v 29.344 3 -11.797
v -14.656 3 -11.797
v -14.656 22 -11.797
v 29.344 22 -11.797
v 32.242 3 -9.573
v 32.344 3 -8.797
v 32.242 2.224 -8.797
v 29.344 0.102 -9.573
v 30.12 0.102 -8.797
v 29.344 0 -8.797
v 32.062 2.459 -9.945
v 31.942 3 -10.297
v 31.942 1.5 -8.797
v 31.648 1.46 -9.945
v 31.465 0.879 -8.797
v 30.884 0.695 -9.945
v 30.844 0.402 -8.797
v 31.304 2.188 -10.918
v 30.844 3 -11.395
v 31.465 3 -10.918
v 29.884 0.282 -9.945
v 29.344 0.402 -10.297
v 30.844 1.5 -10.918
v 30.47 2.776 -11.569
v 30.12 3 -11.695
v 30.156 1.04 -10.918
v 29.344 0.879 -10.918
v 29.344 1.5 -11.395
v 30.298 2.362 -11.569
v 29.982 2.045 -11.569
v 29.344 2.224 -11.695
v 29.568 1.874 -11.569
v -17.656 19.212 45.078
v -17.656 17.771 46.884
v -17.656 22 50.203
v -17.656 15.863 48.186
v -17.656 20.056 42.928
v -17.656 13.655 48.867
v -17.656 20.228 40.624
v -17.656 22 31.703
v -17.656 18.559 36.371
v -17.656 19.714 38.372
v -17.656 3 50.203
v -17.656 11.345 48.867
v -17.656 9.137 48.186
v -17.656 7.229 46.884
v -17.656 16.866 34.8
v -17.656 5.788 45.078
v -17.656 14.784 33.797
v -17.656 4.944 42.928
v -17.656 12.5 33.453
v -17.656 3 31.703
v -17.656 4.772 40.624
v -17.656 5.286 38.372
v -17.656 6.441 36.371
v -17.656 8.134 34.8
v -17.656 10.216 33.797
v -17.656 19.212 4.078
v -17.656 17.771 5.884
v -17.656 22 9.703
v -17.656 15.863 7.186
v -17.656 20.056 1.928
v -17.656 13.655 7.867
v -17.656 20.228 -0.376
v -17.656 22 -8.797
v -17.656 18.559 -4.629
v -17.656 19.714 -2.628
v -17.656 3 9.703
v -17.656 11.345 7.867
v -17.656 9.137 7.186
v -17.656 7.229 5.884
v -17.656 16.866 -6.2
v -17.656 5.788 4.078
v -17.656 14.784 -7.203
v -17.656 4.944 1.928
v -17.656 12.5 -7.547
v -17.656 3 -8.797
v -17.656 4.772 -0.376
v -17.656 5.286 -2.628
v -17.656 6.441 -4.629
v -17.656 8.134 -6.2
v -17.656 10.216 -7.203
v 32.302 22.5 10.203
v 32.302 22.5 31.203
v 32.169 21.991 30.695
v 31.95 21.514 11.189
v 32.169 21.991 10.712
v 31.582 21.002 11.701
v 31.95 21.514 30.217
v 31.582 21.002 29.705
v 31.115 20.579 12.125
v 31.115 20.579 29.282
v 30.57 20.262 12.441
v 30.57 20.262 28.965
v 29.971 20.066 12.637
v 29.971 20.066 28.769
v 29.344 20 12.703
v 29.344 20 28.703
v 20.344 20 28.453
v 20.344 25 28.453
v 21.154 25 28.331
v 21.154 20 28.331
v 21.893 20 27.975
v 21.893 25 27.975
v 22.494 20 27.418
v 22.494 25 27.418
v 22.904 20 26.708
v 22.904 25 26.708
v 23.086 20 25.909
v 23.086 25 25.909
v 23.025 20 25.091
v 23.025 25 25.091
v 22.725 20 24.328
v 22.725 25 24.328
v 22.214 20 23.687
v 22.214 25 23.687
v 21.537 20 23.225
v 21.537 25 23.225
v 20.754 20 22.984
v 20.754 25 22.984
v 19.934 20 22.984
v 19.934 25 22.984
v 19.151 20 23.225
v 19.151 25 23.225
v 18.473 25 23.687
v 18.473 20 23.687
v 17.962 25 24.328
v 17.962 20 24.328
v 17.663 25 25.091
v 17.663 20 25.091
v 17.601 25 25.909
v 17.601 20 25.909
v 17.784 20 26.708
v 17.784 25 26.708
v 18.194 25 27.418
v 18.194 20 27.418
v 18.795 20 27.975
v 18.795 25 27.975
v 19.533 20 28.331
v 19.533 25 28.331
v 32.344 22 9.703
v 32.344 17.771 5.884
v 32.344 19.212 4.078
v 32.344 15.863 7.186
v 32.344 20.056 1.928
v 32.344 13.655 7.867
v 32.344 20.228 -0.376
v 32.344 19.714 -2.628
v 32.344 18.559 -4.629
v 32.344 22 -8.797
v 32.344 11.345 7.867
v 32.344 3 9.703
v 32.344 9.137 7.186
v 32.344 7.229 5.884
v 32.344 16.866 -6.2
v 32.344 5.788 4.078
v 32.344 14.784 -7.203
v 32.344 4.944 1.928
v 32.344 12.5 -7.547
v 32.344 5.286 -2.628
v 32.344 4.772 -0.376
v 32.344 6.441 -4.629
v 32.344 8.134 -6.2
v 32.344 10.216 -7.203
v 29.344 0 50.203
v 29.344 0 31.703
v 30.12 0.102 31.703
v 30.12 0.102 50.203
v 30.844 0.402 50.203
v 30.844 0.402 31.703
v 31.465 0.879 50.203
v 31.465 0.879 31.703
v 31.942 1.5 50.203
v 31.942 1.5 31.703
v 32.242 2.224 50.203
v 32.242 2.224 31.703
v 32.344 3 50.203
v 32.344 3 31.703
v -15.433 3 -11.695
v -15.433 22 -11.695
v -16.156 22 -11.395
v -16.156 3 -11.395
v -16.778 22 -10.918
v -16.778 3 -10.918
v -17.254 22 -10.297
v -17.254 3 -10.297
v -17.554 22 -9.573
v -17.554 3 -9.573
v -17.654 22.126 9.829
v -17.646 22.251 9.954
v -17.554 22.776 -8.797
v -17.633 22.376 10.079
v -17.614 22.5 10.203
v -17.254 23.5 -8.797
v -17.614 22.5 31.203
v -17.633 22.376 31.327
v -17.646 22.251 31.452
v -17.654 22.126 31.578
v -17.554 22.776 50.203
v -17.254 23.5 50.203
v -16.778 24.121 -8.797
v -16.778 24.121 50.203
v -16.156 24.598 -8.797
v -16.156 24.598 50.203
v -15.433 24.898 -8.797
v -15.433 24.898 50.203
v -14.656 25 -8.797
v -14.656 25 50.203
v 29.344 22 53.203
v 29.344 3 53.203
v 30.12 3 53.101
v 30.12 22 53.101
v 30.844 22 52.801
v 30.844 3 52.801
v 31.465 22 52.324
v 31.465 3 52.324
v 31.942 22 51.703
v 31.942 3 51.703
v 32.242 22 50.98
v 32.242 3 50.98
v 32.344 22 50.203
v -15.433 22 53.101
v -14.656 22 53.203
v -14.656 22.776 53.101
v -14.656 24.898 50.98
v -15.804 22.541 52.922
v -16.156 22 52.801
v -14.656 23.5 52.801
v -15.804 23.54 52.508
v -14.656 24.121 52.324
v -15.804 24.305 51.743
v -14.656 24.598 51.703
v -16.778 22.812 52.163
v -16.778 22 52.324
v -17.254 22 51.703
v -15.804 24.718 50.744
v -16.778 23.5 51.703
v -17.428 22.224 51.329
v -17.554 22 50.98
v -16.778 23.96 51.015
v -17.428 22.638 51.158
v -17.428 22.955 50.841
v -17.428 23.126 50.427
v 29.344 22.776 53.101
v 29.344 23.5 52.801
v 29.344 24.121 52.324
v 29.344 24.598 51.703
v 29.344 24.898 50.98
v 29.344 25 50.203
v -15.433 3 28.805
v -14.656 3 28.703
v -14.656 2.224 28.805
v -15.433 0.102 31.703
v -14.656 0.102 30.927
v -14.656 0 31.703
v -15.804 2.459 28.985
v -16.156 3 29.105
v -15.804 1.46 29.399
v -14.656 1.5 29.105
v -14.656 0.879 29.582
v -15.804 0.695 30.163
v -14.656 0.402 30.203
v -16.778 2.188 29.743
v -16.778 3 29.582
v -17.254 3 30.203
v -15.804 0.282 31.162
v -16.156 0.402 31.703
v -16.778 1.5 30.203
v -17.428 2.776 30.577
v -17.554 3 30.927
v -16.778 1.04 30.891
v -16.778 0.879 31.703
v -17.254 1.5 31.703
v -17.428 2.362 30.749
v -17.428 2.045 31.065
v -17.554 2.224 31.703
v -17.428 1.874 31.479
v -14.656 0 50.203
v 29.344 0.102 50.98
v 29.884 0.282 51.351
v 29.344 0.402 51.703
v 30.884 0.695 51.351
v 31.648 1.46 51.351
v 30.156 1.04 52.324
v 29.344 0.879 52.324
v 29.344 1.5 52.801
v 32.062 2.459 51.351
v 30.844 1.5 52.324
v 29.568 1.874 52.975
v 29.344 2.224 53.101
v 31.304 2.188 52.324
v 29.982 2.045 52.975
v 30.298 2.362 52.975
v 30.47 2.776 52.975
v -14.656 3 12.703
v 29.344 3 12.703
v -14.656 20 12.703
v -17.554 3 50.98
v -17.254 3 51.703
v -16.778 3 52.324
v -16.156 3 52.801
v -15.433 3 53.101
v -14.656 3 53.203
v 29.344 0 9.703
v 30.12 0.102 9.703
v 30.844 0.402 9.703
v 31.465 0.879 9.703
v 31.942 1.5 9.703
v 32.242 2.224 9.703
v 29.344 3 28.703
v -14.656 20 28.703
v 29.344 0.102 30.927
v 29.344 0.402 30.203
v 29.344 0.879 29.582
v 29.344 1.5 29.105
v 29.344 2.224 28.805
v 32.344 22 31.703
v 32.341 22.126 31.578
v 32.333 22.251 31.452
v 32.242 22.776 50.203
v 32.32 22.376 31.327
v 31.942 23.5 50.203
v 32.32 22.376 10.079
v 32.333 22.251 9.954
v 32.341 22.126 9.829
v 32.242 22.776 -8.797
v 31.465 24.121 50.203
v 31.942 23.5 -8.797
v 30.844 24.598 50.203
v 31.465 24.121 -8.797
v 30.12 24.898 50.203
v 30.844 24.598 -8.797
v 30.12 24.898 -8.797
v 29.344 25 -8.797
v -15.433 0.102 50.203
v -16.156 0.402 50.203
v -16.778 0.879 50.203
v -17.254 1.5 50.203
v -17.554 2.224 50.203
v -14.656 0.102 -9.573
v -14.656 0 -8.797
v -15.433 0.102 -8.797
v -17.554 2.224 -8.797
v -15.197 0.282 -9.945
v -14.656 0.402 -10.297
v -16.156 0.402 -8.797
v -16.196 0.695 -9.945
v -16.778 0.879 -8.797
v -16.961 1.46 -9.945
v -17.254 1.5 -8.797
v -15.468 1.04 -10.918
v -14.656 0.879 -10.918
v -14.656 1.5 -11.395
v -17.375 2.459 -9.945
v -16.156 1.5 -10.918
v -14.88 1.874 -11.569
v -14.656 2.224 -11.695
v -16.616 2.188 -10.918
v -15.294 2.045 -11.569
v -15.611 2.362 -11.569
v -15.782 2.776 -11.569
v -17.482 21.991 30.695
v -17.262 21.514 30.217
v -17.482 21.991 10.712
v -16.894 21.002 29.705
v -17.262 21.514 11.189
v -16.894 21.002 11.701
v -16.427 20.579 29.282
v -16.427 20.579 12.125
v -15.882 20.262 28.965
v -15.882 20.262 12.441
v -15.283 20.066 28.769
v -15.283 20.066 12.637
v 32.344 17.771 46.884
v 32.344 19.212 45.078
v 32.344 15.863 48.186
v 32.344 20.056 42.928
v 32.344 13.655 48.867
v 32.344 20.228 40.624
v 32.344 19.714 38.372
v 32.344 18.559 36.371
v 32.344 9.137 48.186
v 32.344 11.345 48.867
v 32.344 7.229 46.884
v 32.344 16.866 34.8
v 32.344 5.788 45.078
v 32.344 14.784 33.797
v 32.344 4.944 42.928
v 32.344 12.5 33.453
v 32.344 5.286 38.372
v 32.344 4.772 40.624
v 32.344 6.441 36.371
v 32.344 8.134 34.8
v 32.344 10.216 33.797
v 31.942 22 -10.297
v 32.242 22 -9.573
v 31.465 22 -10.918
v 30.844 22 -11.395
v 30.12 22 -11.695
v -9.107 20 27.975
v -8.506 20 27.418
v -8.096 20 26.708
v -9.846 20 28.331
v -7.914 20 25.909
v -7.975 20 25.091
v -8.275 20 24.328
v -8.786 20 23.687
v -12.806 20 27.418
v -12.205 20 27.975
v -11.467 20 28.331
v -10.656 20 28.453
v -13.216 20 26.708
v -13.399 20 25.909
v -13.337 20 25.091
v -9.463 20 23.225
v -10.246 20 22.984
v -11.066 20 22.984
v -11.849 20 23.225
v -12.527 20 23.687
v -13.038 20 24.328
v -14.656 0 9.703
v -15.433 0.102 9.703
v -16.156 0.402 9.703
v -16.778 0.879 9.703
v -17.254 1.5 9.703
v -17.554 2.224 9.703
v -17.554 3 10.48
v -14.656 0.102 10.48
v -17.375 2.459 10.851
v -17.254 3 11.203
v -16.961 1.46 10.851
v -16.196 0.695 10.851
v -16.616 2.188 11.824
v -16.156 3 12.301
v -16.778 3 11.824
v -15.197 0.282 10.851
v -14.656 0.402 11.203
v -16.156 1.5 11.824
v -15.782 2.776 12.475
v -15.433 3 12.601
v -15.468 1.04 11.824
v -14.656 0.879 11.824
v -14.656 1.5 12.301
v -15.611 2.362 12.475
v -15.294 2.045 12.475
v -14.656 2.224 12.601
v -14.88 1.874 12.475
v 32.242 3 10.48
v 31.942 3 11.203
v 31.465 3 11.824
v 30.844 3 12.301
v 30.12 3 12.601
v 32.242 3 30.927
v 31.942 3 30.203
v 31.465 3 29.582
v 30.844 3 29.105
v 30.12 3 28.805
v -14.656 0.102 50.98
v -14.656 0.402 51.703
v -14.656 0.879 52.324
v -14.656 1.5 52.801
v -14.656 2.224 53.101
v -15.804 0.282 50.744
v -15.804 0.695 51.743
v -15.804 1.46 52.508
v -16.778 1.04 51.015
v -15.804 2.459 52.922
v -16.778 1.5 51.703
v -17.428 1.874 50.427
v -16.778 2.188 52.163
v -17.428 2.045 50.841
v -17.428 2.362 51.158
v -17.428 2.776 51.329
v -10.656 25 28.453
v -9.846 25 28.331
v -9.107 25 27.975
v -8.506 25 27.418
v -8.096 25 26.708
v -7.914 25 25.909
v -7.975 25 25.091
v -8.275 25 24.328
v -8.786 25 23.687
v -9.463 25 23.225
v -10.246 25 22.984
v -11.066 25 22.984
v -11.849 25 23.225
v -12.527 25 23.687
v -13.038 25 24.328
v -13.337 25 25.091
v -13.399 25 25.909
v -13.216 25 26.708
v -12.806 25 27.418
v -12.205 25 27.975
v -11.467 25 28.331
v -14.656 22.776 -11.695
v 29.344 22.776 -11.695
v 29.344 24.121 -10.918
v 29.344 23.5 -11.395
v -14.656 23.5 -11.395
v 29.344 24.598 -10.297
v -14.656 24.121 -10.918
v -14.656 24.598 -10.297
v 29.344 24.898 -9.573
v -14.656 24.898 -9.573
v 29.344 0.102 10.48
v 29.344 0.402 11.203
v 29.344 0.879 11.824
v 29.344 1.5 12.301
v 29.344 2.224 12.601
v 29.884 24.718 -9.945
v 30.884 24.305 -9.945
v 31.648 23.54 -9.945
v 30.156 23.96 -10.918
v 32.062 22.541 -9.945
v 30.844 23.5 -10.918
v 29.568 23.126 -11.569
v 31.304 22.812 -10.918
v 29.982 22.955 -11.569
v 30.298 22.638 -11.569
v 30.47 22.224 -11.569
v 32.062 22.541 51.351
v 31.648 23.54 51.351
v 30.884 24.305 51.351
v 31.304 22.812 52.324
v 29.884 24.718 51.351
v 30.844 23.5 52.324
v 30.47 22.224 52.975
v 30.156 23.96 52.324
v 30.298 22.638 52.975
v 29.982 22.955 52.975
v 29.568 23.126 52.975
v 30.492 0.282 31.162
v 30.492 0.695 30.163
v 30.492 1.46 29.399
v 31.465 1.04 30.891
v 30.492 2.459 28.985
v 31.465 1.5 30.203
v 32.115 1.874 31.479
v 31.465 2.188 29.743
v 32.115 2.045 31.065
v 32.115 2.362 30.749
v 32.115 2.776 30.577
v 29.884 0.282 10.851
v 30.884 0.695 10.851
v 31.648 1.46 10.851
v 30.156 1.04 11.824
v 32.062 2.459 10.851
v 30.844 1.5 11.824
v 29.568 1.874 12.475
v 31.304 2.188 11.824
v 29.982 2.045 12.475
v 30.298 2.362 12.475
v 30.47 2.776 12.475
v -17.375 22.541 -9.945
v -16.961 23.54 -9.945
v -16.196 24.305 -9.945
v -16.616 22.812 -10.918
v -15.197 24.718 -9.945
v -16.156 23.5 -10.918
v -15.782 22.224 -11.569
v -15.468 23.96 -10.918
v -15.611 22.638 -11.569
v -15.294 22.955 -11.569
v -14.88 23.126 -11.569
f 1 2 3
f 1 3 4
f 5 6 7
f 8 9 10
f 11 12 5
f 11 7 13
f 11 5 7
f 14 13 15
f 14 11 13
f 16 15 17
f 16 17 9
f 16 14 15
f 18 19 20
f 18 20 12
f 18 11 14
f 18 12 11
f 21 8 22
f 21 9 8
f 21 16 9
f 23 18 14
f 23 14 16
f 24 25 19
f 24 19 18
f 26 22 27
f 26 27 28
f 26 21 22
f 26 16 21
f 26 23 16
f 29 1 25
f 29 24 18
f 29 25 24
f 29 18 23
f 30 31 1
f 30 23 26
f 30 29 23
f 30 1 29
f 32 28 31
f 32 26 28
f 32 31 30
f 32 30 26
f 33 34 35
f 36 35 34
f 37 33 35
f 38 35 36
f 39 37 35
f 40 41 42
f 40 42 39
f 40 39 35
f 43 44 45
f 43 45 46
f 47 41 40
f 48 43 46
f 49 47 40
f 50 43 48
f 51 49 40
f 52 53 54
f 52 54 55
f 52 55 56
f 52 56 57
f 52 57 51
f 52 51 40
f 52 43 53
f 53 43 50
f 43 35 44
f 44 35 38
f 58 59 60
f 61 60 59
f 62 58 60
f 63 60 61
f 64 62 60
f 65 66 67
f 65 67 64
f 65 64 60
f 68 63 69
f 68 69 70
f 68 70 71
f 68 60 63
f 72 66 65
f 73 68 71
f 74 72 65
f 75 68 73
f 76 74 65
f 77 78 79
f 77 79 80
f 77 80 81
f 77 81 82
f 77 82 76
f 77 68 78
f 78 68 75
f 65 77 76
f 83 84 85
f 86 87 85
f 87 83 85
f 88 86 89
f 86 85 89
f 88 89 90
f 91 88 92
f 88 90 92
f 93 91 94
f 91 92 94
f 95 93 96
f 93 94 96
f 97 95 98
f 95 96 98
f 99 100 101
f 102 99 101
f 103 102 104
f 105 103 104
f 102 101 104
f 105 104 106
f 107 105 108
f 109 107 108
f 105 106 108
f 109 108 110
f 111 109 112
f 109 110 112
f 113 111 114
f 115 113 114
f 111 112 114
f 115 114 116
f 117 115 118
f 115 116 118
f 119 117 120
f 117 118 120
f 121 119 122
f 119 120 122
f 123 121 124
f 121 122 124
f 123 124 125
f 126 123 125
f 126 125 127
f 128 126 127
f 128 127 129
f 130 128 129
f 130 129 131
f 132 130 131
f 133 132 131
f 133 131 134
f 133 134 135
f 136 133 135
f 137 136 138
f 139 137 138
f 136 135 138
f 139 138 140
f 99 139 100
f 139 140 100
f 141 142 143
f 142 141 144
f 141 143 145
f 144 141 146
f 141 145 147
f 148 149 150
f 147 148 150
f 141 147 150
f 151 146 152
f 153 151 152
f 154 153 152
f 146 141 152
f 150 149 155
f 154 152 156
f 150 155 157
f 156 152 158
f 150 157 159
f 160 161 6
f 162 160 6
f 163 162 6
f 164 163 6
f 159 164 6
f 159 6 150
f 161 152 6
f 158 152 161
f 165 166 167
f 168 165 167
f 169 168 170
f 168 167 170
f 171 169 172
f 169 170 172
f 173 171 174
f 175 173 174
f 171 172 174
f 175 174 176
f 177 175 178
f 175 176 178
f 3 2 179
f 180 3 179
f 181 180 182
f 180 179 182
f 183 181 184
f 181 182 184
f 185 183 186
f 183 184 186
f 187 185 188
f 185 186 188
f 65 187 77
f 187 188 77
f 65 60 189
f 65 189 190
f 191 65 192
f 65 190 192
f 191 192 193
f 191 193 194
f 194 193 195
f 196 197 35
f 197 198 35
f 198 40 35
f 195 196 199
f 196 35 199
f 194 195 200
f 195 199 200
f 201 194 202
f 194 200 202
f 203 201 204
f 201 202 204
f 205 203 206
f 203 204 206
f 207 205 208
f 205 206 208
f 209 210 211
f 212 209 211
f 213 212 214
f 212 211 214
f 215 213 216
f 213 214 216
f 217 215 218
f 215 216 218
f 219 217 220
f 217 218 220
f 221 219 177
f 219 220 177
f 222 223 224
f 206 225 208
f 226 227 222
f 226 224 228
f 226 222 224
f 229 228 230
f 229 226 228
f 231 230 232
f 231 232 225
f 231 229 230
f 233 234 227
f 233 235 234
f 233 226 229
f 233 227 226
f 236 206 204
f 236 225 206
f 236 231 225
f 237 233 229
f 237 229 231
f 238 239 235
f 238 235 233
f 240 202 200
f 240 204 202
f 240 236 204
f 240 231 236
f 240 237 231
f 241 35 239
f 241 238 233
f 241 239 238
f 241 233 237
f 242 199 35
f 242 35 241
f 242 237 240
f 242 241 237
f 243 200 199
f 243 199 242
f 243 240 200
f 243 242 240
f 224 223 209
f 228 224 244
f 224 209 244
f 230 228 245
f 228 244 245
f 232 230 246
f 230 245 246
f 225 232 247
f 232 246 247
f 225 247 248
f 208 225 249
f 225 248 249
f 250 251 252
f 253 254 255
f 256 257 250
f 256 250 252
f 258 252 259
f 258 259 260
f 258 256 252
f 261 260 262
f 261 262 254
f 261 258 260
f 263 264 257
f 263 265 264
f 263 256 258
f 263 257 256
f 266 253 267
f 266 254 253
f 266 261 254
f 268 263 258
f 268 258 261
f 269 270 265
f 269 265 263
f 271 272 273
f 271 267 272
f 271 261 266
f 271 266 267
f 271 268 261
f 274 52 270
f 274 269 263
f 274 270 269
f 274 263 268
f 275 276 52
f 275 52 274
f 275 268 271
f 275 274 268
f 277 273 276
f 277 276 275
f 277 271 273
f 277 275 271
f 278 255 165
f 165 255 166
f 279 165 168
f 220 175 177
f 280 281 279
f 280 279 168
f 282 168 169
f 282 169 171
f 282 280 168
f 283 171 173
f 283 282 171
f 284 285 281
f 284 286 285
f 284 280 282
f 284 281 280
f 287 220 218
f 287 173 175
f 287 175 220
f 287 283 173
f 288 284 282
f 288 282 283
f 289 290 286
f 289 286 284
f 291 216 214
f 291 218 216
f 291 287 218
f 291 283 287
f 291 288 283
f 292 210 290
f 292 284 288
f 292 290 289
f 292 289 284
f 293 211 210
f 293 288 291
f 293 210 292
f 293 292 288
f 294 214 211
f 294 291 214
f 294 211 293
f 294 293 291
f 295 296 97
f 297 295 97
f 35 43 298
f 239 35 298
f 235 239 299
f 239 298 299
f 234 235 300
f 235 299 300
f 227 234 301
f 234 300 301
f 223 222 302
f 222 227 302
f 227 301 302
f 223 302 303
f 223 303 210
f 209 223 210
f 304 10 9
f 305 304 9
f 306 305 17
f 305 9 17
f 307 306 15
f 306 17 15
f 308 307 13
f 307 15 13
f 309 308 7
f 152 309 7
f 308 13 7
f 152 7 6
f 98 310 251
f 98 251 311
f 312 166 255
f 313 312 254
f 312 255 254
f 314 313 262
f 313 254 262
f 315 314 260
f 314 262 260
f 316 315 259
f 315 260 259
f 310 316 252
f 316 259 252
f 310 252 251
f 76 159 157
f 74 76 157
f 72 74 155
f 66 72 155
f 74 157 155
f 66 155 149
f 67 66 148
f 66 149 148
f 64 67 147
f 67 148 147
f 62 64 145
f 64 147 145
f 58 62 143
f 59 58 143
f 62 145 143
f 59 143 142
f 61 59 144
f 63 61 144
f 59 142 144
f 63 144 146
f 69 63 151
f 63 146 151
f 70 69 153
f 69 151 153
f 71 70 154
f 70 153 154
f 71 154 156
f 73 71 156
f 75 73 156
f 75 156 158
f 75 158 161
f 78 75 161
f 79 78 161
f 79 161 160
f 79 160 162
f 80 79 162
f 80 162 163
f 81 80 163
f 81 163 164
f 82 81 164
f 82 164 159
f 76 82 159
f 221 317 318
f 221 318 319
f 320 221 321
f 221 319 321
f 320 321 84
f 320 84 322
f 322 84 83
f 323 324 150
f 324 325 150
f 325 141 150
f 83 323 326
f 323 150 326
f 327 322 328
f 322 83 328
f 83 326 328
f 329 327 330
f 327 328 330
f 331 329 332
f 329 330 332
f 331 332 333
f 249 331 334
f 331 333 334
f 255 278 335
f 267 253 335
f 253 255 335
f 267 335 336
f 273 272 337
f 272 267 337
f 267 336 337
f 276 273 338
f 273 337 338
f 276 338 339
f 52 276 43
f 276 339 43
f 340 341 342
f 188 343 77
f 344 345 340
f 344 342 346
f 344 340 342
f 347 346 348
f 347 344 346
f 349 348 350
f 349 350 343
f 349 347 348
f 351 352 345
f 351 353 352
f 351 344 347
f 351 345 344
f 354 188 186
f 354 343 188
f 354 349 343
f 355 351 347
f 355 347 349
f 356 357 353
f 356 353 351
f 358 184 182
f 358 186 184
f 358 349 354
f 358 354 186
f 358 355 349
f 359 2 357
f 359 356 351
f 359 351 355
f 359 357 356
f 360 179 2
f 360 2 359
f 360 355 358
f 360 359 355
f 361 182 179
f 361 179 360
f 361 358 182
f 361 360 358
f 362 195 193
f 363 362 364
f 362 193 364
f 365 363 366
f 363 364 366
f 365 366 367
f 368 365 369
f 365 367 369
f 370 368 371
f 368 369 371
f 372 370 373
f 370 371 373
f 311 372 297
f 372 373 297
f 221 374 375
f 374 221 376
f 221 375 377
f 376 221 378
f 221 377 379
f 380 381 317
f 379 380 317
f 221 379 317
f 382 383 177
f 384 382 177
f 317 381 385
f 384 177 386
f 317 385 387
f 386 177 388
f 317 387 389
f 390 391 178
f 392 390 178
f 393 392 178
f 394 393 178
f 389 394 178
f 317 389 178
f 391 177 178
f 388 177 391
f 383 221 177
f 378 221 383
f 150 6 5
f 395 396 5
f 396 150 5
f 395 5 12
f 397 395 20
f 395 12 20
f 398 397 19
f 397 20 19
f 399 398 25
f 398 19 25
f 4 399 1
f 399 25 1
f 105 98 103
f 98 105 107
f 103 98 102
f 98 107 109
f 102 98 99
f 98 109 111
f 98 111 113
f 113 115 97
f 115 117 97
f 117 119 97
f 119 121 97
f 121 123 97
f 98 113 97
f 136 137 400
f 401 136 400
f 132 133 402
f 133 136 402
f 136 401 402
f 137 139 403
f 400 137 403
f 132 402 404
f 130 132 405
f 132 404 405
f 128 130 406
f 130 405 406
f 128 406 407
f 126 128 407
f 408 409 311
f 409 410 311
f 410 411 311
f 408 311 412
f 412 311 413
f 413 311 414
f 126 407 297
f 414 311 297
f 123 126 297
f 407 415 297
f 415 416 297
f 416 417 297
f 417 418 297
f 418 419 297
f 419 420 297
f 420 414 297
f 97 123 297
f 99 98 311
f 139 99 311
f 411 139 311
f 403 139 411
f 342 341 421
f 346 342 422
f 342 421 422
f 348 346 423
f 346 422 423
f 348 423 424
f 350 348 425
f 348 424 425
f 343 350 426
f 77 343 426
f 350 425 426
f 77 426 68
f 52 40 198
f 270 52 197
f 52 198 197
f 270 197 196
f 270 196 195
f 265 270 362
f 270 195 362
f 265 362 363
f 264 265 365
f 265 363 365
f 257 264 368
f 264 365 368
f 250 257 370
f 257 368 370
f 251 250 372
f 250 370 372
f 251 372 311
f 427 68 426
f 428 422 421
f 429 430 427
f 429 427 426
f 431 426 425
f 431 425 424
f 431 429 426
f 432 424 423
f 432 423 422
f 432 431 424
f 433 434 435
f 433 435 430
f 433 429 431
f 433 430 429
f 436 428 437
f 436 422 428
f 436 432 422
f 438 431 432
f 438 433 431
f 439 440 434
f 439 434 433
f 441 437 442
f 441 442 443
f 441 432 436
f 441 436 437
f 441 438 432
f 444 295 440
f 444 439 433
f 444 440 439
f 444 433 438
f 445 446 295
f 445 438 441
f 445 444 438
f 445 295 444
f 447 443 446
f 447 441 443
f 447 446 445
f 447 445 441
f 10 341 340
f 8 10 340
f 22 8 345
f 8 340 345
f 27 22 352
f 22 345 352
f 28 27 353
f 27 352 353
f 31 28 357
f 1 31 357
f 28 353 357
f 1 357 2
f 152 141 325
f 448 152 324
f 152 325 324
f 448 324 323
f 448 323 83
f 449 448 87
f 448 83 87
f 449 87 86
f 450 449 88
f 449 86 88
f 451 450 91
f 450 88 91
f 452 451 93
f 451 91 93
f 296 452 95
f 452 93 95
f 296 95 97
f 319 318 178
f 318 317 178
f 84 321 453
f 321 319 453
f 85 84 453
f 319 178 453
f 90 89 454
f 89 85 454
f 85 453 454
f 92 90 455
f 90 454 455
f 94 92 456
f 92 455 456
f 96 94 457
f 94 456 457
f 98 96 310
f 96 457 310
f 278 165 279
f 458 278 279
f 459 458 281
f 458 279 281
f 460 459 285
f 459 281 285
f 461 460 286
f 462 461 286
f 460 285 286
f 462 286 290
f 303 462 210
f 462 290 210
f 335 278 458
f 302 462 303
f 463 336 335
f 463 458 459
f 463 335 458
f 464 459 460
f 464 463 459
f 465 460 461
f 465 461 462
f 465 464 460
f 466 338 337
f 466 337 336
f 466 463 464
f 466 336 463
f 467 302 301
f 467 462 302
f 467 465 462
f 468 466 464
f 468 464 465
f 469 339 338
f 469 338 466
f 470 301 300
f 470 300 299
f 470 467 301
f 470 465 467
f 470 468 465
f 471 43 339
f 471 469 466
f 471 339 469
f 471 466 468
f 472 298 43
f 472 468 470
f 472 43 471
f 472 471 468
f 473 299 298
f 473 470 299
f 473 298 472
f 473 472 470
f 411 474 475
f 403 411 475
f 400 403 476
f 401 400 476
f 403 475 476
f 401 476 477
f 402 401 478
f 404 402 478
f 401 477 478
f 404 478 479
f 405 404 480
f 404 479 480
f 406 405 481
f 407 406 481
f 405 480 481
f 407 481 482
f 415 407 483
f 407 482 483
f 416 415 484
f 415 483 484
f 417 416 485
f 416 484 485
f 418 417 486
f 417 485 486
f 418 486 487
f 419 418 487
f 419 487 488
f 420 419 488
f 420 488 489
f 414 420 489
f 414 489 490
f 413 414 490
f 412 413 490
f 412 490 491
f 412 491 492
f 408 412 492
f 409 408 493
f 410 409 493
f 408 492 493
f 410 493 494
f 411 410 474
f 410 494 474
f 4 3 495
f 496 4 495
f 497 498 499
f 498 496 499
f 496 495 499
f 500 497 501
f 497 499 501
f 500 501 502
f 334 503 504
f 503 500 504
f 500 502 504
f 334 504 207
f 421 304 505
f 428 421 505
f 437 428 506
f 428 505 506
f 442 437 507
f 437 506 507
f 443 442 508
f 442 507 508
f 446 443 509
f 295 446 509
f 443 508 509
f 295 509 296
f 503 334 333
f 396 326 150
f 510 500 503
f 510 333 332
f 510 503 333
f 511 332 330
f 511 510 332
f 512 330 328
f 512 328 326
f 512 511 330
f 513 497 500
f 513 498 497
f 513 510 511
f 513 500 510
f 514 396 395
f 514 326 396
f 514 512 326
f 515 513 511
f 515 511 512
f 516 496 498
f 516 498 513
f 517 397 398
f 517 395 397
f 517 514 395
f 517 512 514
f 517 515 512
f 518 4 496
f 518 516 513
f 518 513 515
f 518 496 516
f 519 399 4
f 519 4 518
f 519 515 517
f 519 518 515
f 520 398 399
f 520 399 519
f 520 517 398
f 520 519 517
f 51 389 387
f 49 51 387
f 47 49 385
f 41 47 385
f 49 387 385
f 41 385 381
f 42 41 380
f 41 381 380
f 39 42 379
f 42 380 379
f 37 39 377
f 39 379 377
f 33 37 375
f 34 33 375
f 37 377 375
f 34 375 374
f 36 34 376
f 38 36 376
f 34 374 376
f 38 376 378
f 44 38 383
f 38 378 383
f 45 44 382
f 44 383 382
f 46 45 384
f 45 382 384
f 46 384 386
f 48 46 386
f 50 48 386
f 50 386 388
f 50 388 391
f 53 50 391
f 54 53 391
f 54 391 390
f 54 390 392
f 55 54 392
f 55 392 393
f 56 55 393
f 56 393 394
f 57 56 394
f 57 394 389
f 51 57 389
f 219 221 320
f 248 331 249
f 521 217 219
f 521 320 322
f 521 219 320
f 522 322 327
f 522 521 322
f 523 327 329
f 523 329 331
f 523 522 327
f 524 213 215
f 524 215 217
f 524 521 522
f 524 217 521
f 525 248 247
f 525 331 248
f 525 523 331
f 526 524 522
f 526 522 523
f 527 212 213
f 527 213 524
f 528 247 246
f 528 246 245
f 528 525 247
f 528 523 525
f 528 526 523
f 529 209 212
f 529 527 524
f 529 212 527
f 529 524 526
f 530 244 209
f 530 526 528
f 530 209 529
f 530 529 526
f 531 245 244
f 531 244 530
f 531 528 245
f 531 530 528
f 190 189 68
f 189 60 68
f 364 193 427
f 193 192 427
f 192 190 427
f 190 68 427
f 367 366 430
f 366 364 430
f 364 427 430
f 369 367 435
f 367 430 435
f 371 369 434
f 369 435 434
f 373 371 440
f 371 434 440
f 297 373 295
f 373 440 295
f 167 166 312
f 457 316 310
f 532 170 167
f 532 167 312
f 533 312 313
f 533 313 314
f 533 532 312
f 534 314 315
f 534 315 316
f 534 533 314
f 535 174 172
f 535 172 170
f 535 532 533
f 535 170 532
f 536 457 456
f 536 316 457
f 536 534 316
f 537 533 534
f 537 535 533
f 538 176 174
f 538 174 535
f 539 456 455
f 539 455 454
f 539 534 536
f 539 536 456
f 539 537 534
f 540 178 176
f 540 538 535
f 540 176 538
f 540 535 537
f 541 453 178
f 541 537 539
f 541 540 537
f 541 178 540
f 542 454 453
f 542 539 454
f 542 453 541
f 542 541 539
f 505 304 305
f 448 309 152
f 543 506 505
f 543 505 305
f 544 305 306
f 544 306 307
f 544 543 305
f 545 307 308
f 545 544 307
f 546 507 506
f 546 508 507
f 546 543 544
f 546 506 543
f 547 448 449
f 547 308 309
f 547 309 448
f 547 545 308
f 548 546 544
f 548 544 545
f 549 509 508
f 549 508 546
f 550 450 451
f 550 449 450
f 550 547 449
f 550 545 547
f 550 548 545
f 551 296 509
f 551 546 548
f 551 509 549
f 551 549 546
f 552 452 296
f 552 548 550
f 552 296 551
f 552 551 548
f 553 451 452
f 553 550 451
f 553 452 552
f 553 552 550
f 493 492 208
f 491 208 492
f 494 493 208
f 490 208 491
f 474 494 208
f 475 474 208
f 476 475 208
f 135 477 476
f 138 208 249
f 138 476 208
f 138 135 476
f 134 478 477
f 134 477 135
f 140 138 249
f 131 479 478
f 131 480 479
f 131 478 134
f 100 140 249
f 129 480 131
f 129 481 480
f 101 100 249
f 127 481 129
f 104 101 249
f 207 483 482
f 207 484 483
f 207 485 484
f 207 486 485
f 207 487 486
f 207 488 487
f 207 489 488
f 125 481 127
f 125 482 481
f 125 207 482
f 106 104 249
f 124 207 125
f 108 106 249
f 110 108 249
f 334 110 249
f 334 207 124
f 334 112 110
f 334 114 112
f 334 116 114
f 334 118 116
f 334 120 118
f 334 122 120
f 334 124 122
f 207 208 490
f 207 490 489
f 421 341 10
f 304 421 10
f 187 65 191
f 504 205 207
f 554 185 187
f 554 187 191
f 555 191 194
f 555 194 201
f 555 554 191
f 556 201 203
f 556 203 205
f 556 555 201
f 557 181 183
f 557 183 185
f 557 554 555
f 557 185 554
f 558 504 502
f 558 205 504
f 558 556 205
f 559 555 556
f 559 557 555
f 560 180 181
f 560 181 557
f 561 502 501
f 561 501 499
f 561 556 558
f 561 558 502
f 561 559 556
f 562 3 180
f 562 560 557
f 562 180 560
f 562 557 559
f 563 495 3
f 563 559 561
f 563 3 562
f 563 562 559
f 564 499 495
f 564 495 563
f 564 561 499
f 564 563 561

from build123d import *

# Parameters (mm, degrees)
SKETCH_1_W          = 50
SKETCH_1_H          = 65
EXTRUDE_1_DEPTH     = 25
SKETCH_2_R          = 7.75
SKETCH_2_W          = 16
SKETCH_2_H          = 21.892598188
CUT_EXTRUDE_1_DEPTH = 78.172355865
SKETCH_4_R          = 2.75
CUT_EXTRUDE_3_DEPTH = 5
FILLET_1_R          = 3


with BuildPart() as part:
    # 草图1 → 凸台-拉伸1 (new body)
    with BuildSketch(Plane(origin=(0, 0, 0), x_dir=(1, 0, 0), z_dir=(0, 1, 0))):
        with Locations((7.34375, -20.703125)):
            Rectangle(SKETCH_1_W, SKETCH_1_H)
    extrude(amount=EXTRUDE_1_DEPTH)

    # 草图2 → 切除-拉伸1 (cut, through all)
    with BuildSketch(Plane(origin=(32.34375, 0, 0), x_dir=(0, 0, -1), z_dir=(1, 0, 0))):
        with Locations((-41.203125, 12.5)):
            Circle(SKETCH_2_R)
        with Locations((-0.203125, 12.5)):
            Circle(SKETCH_2_R)
        with Locations((-20.703125, 9.053700906)):
            Rectangle(SKETCH_2_W, SKETCH_2_H)
    extrude(amount=-CUT_EXTRUDE_1_DEPTH, mode=Mode.SUBTRACT)

    # 草图4 → 切除-拉伸3 (cut)
    with BuildSketch(Plane(origin=(0, 25, 0), x_dir=(1, 0, 0), z_dir=(0, 1, 0))):
        with Locations(Location((20.34375, -25.703125, 0), (0, 0, 270))):
            Circle(SKETCH_4_R)
        with Locations(Location((-10.65625, -25.703125, 0), (0, 0, 270))):
            Circle(SKETCH_4_R)
    extrude(amount=-CUT_EXTRUDE_3_DEPTH, mode=Mode.SUBTRACT)

    # 圆角1
    # the kernel refuses this fillet: 3 mm, written as the material it takes off along each edge
    with BuildSketch(Plane(origin=(29.34375, 22, -8.796875), x_dir=(1, 0, 0), z_dir=(0, 0, -1))) as fillet_1_piece_1_section:
        Polygon((0, 0), (FILLET_1_R, 0), (FILLET_1_R, -FILLET_1_R), (0, -FILLET_1_R), align=None)
    fillet_1_piece_1 = extrude(amount=FILLET_1_R, mode=Mode.PRIVATE)
    fillet_1_piece_1 = fillet_1_piece_1 - Plane(origin=(29.34375, 22, -8.796875), x_dir=(-0.7071067811865475, -0.7071067811865475, 0), z_dir=(0, 0, -1)) * Sphere(FILLET_1_R, mode=Mode.PRIVATE)
    add(fillet_1_piece_1, mode=Mode.SUBTRACT)
    with BuildSketch(Plane(origin=(29.34375, 22, 50.203125), x_dir=(1, 0, 0), z_dir=(0, 0, 1))) as fillet_1_piece_2_section:
        Polygon((0, 0), (FILLET_1_R, 0), (FILLET_1_R, FILLET_1_R), (0, FILLET_1_R), align=None)
    fillet_1_piece_2 = extrude(amount=FILLET_1_R, mode=Mode.PRIVATE)
    fillet_1_piece_2 = fillet_1_piece_2 - Plane(origin=(29.34375, 22, 50.203125), x_dir=(-0.7071067811865475, -0.7071067811865475, 0), z_dir=(0, 0, 1)) * Sphere(FILLET_1_R, mode=Mode.PRIVATE)
    add(fillet_1_piece_2, mode=Mode.SUBTRACT)
    with BuildSketch(Plane(origin=(-14.65625, 22, -8.796875), x_dir=(-1, 0, 0), z_dir=(0, 0, -1))) as fillet_1_piece_3_section:
        Polygon((0, 0), (FILLET_1_R, 0), (FILLET_1_R, FILLET_1_R), (0, FILLET_1_R), align=None)
    fillet_1_piece_3 = extrude(amount=FILLET_1_R, mode=Mode.PRIVATE)
    fillet_1_piece_3 = fillet_1_piece_3 - Plane(origin=(-14.65625, 22, -8.796875), x_dir=(0.7071067811865475, -0.7071067811865475, 0), z_dir=(0, 0, -1)) * Sphere(FILLET_1_R, mode=Mode.PRIVATE)
    add(fillet_1_piece_3, mode=Mode.SUBTRACT)
    with BuildSketch(Plane(origin=(-14.65625, 3, 50.203125), x_dir=(0, -1, 0), z_dir=(-1, 0, 0))) as fillet_1_piece_4_section:
        Polygon((0, 0), (FILLET_1_R, 0), (FILLET_1_R, FILLET_1_R), (0, FILLET_1_R), align=None)
    fillet_1_piece_4 = extrude(amount=FILLET_1_R, mode=Mode.PRIVATE)
    fillet_1_piece_4 = fillet_1_piece_4 - Plane(origin=(-14.65625, 3, 50.203125), x_dir=(0, 0.7071067811865475, -0.7071067811865475), z_dir=(-1, 0, 0)) * Sphere(FILLET_1_R, mode=Mode.PRIVATE)
    add(fillet_1_piece_4, mode=Mode.SUBTRACT)
    with BuildSketch(Plane(origin=(-14.65625, 3, 31.703125), x_dir=(0, -1, 0), z_dir=(-1, 0, 0))) as fillet_1_piece_5_section:
        Polygon((0, 0), (FILLET_1_R, 0), (FILLET_1_R, -FILLET_1_R), (0, -FILLET_1_R), align=None)
    fillet_1_piece_5 = extrude(amount=FILLET_1_R, mode=Mode.PRIVATE)
    fillet_1_piece_5 = fillet_1_piece_5 - Plane(origin=(-14.65625, 3, 31.703125), x_dir=(0, 0.7071067811865475, 0.7071067811865475), z_dir=(-1, 0, 0)) * Sphere(FILLET_1_R, mode=Mode.PRIVATE)
    add(fillet_1_piece_5, mode=Mode.SUBTRACT)
    with BuildSketch(Plane(origin=(29.34375, 3, -8.796875), x_dir=(1, 0, 0), z_dir=(0, 0, -1))) as fillet_1_piece_6_section:
        Polygon((0, 0), (FILLET_1_R, 0), (FILLET_1_R, FILLET_1_R), (0, FILLET_1_R), align=None)
    fillet_1_piece_6 = extrude(amount=FILLET_1_R, mode=Mode.PRIVATE)
    fillet_1_piece_6 = fillet_1_piece_6 - Plane(origin=(29.34375, 3, -8.796875), x_dir=(-0.7071067811865475, 0.7071067811865475, 0), z_dir=(0, 0, -1)) * Sphere(FILLET_1_R, mode=Mode.PRIVATE)
    add(fillet_1_piece_6, mode=Mode.SUBTRACT)
    with BuildSketch(Plane(origin=(29.34375, 3, 9.703125), x_dir=(1, 0, 0), z_dir=(0, 0, 1))) as fillet_1_piece_7_section:
        Polygon((0, 0), (FILLET_1_R, 0), (FILLET_1_R, -FILLET_1_R), (0, -FILLET_1_R), align=None)
    fillet_1_piece_7 = extrude(amount=FILLET_1_R, mode=Mode.PRIVATE)
    fillet_1_piece_7 = fillet_1_piece_7 - Plane(origin=(29.34375, 3, 9.703125), x_dir=(-0.7071067811865475, 0.7071067811865475, 0), z_dir=(0, 0, 1)) * Sphere(FILLET_1_R, mode=Mode.PRIVATE)
    add(fillet_1_piece_7, mode=Mode.SUBTRACT)
    with BuildSketch(Plane(origin=(29.34375, 3, 31.703125), x_dir=(0, -1, 0), z_dir=(1, 0, 0))) as fillet_1_piece_8_section:
        Polygon((0, 0), (FILLET_1_R, 0), (FILLET_1_R, FILLET_1_R), (0, FILLET_1_R), align=None)
    fillet_1_piece_8 = extrude(amount=FILLET_1_R, mode=Mode.PRIVATE)
    fillet_1_piece_8 = fillet_1_piece_8 - Plane(origin=(29.34375, 3, 31.703125), x_dir=(0, 0.7071067811865475, 0.7071067811865475), z_dir=(1, 0, 0)) * Sphere(FILLET_1_R, mode=Mode.PRIVATE)
    add(fillet_1_piece_8, mode=Mode.SUBTRACT)
    with BuildSketch(Plane(origin=(-14.65625, 3, 9.703125), x_dir=(-1, 0, 0), z_dir=(0, 0, 1))) as fillet_1_piece_9_section:
        Polygon((0, 0), (FILLET_1_R, 0), (FILLET_1_R, FILLET_1_R), (0, FILLET_1_R), align=None)
    fillet_1_piece_9 = extrude(amount=FILLET_1_R, mode=Mode.PRIVATE)
    fillet_1_piece_9 = fillet_1_piece_9 - Plane(origin=(-14.65625, 3, 9.703125), x_dir=(0.7071067811865475, 0.7071067811865475, 0), z_dir=(0, 0, 1)) * Sphere(FILLET_1_R, mode=Mode.PRIVATE)
    add(fillet_1_piece_9, mode=Mode.SUBTRACT)
    with BuildSketch(Plane(origin=(-14.65625, 22, 50.203125), x_dir=(0, 1, 0), z_dir=(-1, 0, 0))) as fillet_1_piece_10_section:
        Polygon((0, 0), (FILLET_1_R, 0), (FILLET_1_R, -FILLET_1_R), (0, -FILLET_1_R), align=None)
    fillet_1_piece_10 = extrude(amount=FILLET_1_R, mode=Mode.PRIVATE)
    fillet_1_piece_10 = fillet_1_piece_10 - Plane(origin=(-14.65625, 22, 50.203125), x_dir=(0, -0.7071067811865475, -0.7071067811865475), z_dir=(-1, 0, 0)) * Sphere(FILLET_1_R, mode=Mode.PRIVATE)
    add(fillet_1_piece_10, mode=Mode.SUBTRACT)
    with BuildSketch(Plane(origin=(-14.65625, 3, -8.796875), x_dir=(-1, 0, 0), z_dir=(0, 0, -1))) as fillet_1_piece_11_section:
        Polygon((0, 0), (FILLET_1_R, 0), (FILLET_1_R, -FILLET_1_R), (0, -FILLET_1_R), align=None)
    fillet_1_piece_11 = extrude(amount=FILLET_1_R, mode=Mode.PRIVATE)
    fillet_1_piece_11 = fillet_1_piece_11 - Plane(origin=(-14.65625, 3, -8.796875), x_dir=(0.7071067811865475, 0.7071067811865475, 0), z_dir=(0, 0, -1)) * Sphere(FILLET_1_R, mode=Mode.PRIVATE)
    add(fillet_1_piece_11, mode=Mode.SUBTRACT)
    with BuildSketch(Plane(origin=(29.34375, 3, 50.203125), x_dir=(1, 0, 0), z_dir=(0, 0, 1))) as fillet_1_piece_12_section:
        Polygon((0, 0), (FILLET_1_R, 0), (FILLET_1_R, -FILLET_1_R), (0, -FILLET_1_R), align=None)
    fillet_1_piece_12 = extrude(amount=FILLET_1_R, mode=Mode.PRIVATE)
    fillet_1_piece_12 = fillet_1_piece_12 - Plane(origin=(29.34375, 3, 50.203125), x_dir=(-0.7071067811865475, 0.7071067811865475, 0), z_dir=(0, 0, 1)) * Sphere(FILLET_1_R, mode=Mode.PRIVATE)
    add(fillet_1_piece_12, mode=Mode.SUBTRACT)
    with BuildSketch(Plane(origin=(32.34375, 25, -8.796875), x_dir=(0, -1, 0), z_dir=(0, 0, 1)), Plane(origin=(-17.65625, 25, 50.203125), x_dir=(0, -1, 0), z_dir=(0, 0, -1))) as fillet_1_piece_13:
        with BuildLine():
            CenterArc((FILLET_1_R, -FILLET_1_R), FILLET_1_R, 90, 90)
            Line((0, -FILLET_1_R), (0, 0))
            Line((0, 0), (FILLET_1_R, 0))
        make_face()
    extrude(amount=59, mode=Mode.SUBTRACT)
    with BuildSketch(Plane(origin=(-14.65625, 25, -11.796875), x_dir=(0, -1, 0), z_dir=(1, 0, 0)), Plane(origin=(-14.65625, 0, 28.703125), x_dir=(0, 0, 1), z_dir=(1, 0, 0)), Plane(origin=(29.34375, 0, 12.703125), x_dir=(0, 0, -1), z_dir=(-1, 0, 0)), Plane(origin=(29.34375, 0, 53.203125), x_dir=(0, 0, -1), z_dir=(-1, 0, 0))) as fillet_1_piece_14:
        with BuildLine():
            CenterArc((FILLET_1_R, -FILLET_1_R), FILLET_1_R, 90, 90)
            Line((0, -FILLET_1_R), (0, 0))
            Line((0, 0), (FILLET_1_R, 0))
        make_face()
    extrude(amount=44, mode=Mode.SUBTRACT)
    with BuildSketch(Plane(origin=(-17.65625, 0, 50.203125), x_dir=(0, 1, 0), z_dir=(0, 0, -1)), Plane(origin=(32.34375, 0, -8.796875), x_dir=(0, 1, 0), z_dir=(0, 0, 1)), Plane(origin=(32.34375, 0, 31.703125), x_dir=(0, 1, 0), z_dir=(0, 0, 1)), Plane(origin=(-17.65625, 0, 9.703125), x_dir=(0, 1, 0), z_dir=(0, 0, -1))) as fillet_1_piece_15:
        with BuildLine():
            CenterArc((FILLET_1_R, FILLET_1_R), FILLET_1_R, 180, 90)
            Line((0, FILLET_1_R), (0, 0))
            Line((0, 0), (FILLET_1_R, 0))
        make_face()
    extrude(amount=18.5, mode=Mode.SUBTRACT)
    with BuildSketch(Plane(origin=(-17.65625, 3, 12.703125), x_dir=(0, 0, -1), z_dir=(0, 1, 0)), Plane(origin=(-17.65625, 20, 28.703125), x_dir=(0, 0, 1), z_dir=(0, -1, 0)), Plane(origin=(32.34375, 3, 28.703125), x_dir=(0, 0, 1), z_dir=(0, 1, 0)), Plane(origin=(32.34375, 20, 12.703125), x_dir=(0, 0, -1), z_dir=(0, -1, 0))) as fillet_1_piece_16:
        with BuildLine():
            CenterArc((FILLET_1_R, -FILLET_1_R), FILLET_1_R, 90, 90)
            Line((0, -FILLET_1_R), (0, 0))
            Line((0, 0), (FILLET_1_R, 0))
        make_face()
    extrude(amount=17, mode=Mode.SUBTRACT)
    with BuildSketch(Plane(origin=(32.34375, 20, 28.703125), x_dir=(0, 1, 0), z_dir=(0, 0, -1)), Plane(origin=(-17.65625, 20, 12.703125), x_dir=(0, 1, 0), z_dir=(0, 0, 1))) as fillet_1_piece_17:
        with BuildLine():
            CenterArc((FILLET_1_R, -FILLET_1_R), FILLET_1_R, 90, 90)
            Line((0, -FILLET_1_R), (0, 0))
            Line((0, 0), (FILLET_1_R, 0))
        make_face()
    extrude(amount=16, mode=Mode.SUBTRACT)
    with BuildSketch(Plane(origin=(-14.65625, 0, -11.796875), x_dir=(0, 1, 0), z_dir=(1, 0, 0)), Plane(origin=(29.34375, 25, 53.203125), x_dir=(0, 0, -1), z_dir=(-1, 0, 0))) as fillet_1_piece_18:
        with BuildLine():
            CenterArc((FILLET_1_R, FILLET_1_R), FILLET_1_R, 180, 90)
            Line((0, FILLET_1_R), (0, 0))
            Line((0, 0), (FILLET_1_R, 0))
        make_face()
    extrude(amount=44, mode=Mode.SUBTRACT)
    with BuildSketch(Plane(origin=(-17.65625, 3, -11.796875), x_dir=(1, 0, 0), z_dir=(0, 1, 0)), Plane(origin=(-17.65625, 3, 53.203125), x_dir=(0, 0, -1), z_dir=(0, 1, 0))) as fillet_1_piece_19:
        with BuildLine():
            CenterArc((FILLET_1_R, -FILLET_1_R), FILLET_1_R, 90, 90)
            Line((0, -FILLET_1_R), (0, 0))
            Line((0, 0), (FILLET_1_R, 0))
        make_face()
    extrude(amount=19, mode=Mode.SUBTRACT)
    with BuildSketch(Plane(origin=(32.34375, 3, -11.796875), x_dir=(-1, 0, 0), z_dir=(0, 1, 0)), Plane(origin=(32.34375, 3, 53.203125), x_dir=(0, 0, -1), z_dir=(0, 1, 0))) as fillet_1_piece_20:
        with BuildLine():
            CenterArc((FILLET_1_R, FILLET_1_R), FILLET_1_R, 180, 90)
            Line((0, FILLET_1_R), (0, 0))
            Line((0, 0), (FILLET_1_R, 0))
        make_face()
    extrude(amount=19, mode=Mode.SUBTRACT)
    with BuildSketch(Plane(origin=(-17.65625, 20, 5.203125), x_dir=(0, 1, 0), z_dir=(0, 0, 1))) as fillet_1_piece_21a_section:
        with BuildLine():
            CenterArc((FILLET_1_R, -FILLET_1_R), FILLET_1_R, 90, 90)
            Line((0, -FILLET_1_R), (0, 0))
            Line((0, 0), (FILLET_1_R, 0))
        make_face()
    fillet_1_piece_21a = extrude(amount=23.5, mode=Mode.PRIVATE)
    fillet_1_piece_21a = split(fillet_1_piece_21a, bisect_by=Plane(origin=(-16.977064657, 20.679185343, 12.703125), z_dir=(0, 0, -1)), keep=Keep.TOP, mode=Mode.PRIVATE)
    with BuildSketch(Plane(origin=(-17.65625, 3, 12.703125), x_dir=(0, 0, -1), z_dir=(0, 1, 0))) as fillet_1_piece_21b_section:
        with BuildLine():
            CenterArc((FILLET_1_R, -FILLET_1_R), FILLET_1_R, 90, 90)
            Line((0, -FILLET_1_R), (0, 0))
            Line((0, 0), (FILLET_1_R, 0))
        make_face()
    fillet_1_piece_21b = extrude(amount=24.5, mode=Mode.PRIVATE)
    fillet_1_piece_21b = split(fillet_1_piece_21b, bisect_by=Plane(origin=(-16.977064657, 20, 12.023939657), z_dir=(0, 1, 0)), keep=Keep.TOP, mode=Mode.PRIVATE)
    fillet_1_piece_21 = fillet_1_piece_21a & fillet_1_piece_21b
    add(fillet_1_piece_21, mode=Mode.SUBTRACT)
    with BuildSketch(Plane(origin=(-17.65625, 27.5, 28.703125), x_dir=(0, 0, 1), z_dir=(0, -1, 0))) as fillet_1_piece_22a_section:
        with BuildLine():
            CenterArc((FILLET_1_R, -FILLET_1_R), FILLET_1_R, 90, 90)
            Line((0, -FILLET_1_R), (0, 0))
            Line((0, 0), (FILLET_1_R, 0))
        make_face()
    fillet_1_piece_22a = extrude(amount=24.5, mode=Mode.PRIVATE)
    fillet_1_piece_22a = split(fillet_1_piece_22a, bisect_by=Plane(origin=(-16.977064657, 20, 29.382310343), z_dir=(0, 1, 0)), keep=Keep.TOP, mode=Mode.PRIVATE)
    with BuildSketch(Plane(origin=(-17.65625, 20, 12.703125), x_dir=(0, 1, 0), z_dir=(0, 0, 1))) as fillet_1_piece_22b_section:
        with BuildLine():
            CenterArc((FILLET_1_R, -FILLET_1_R), FILLET_1_R, 90, 90)
            Line((0, -FILLET_1_R), (0, 0))
            Line((0, 0), (FILLET_1_R, 0))
        make_face()
    fillet_1_piece_22b = extrude(amount=23.5, mode=Mode.PRIVATE)
    fillet_1_piece_22b = split(fillet_1_piece_22b, bisect_by=Plane(origin=(-16.977064657, 20.679185343, 28.703125), z_dir=(0, 0, 1)), keep=Keep.TOP, mode=Mode.PRIVATE)
    fillet_1_piece_22 = fillet_1_piece_22a & fillet_1_piece_22b
    add(fillet_1_piece_22, mode=Mode.SUBTRACT)
    with BuildSketch(Plane(origin=(32.34375, 20, 36.203125), x_dir=(0, 1, 0), z_dir=(0, 0, -1))) as fillet_1_piece_23a_section:
        with BuildLine():
            CenterArc((FILLET_1_R, -FILLET_1_R), FILLET_1_R, 90, 90)
            Line((0, -FILLET_1_R), (0, 0))
            Line((0, 0), (FILLET_1_R, 0))
        make_face()
    fillet_1_piece_23a = extrude(amount=23.5, mode=Mode.PRIVATE)
    fillet_1_piece_23a = split(fillet_1_piece_23a, bisect_by=Plane(origin=(31.664564657, 20.679185343, 28.703125), z_dir=(0, 0, 1)), keep=Keep.TOP, mode=Mode.PRIVATE)
    with BuildSketch(Plane(origin=(32.34375, 3, 28.703125), x_dir=(0, 0, 1), z_dir=(0, 1, 0))) as fillet_1_piece_23b_section:
        with BuildLine():
            CenterArc((FILLET_1_R, -FILLET_1_R), FILLET_1_R, 90, 90)
            Line((0, -FILLET_1_R), (0, 0))
            Line((0, 0), (FILLET_1_R, 0))
        make_face()
    fillet_1_piece_23b = extrude(amount=24.5, mode=Mode.PRIVATE)
    fillet_1_piece_23b = split(fillet_1_piece_23b, bisect_by=Plane(origin=(31.664564657, 20, 29.382310343), z_dir=(0, 1, 0)), keep=Keep.TOP, mode=Mode.PRIVATE)
    fillet_1_piece_23 = fillet_1_piece_23a & fillet_1_piece_23b
    add(fillet_1_piece_23, mode=Mode.SUBTRACT)
    with BuildSketch(Plane(origin=(32.34375, 27.5, 12.703125), x_dir=(0, 0, -1), z_dir=(0, -1, 0))) as fillet_1_piece_24a_section:
        with BuildLine():
            CenterArc((FILLET_1_R, -FILLET_1_R), FILLET_1_R, 90, 90)
            Line((0, -FILLET_1_R), (0, 0))
            Line((0, 0), (FILLET_1_R, 0))
        make_face()
    fillet_1_piece_24a = extrude(amount=24.5, mode=Mode.PRIVATE)
    fillet_1_piece_24a = split(fillet_1_piece_24a, bisect_by=Plane(origin=(31.664564657, 20, 12.023939657), z_dir=(0, 1, 0)), keep=Keep.TOP, mode=Mode.PRIVATE)
    with BuildSketch(Plane(origin=(32.34375, 20, 28.703125), x_dir=(0, 1, 0), z_dir=(0, 0, -1))) as fillet_1_piece_24b_section:
        with BuildLine():
            CenterArc((FILLET_1_R, -FILLET_1_R), FILLET_1_R, 90, 90)
            Line((0, -FILLET_1_R), (0, 0))
            Line((0, 0), (FILLET_1_R, 0))
        make_face()
    fillet_1_piece_24b = extrude(amount=23.5, mode=Mode.PRIVATE)
    fillet_1_piece_24b = split(fillet_1_piece_24b, bisect_by=Plane(origin=(31.664564657, 20.679185343, 12.703125), z_dir=(0, 0, -1)), keep=Keep.TOP, mode=Mode.PRIVATE)
    fillet_1_piece_24 = fillet_1_piece_24a & fillet_1_piece_24b
    add(fillet_1_piece_24, mode=Mode.SUBTRACT)


solid = part.part
